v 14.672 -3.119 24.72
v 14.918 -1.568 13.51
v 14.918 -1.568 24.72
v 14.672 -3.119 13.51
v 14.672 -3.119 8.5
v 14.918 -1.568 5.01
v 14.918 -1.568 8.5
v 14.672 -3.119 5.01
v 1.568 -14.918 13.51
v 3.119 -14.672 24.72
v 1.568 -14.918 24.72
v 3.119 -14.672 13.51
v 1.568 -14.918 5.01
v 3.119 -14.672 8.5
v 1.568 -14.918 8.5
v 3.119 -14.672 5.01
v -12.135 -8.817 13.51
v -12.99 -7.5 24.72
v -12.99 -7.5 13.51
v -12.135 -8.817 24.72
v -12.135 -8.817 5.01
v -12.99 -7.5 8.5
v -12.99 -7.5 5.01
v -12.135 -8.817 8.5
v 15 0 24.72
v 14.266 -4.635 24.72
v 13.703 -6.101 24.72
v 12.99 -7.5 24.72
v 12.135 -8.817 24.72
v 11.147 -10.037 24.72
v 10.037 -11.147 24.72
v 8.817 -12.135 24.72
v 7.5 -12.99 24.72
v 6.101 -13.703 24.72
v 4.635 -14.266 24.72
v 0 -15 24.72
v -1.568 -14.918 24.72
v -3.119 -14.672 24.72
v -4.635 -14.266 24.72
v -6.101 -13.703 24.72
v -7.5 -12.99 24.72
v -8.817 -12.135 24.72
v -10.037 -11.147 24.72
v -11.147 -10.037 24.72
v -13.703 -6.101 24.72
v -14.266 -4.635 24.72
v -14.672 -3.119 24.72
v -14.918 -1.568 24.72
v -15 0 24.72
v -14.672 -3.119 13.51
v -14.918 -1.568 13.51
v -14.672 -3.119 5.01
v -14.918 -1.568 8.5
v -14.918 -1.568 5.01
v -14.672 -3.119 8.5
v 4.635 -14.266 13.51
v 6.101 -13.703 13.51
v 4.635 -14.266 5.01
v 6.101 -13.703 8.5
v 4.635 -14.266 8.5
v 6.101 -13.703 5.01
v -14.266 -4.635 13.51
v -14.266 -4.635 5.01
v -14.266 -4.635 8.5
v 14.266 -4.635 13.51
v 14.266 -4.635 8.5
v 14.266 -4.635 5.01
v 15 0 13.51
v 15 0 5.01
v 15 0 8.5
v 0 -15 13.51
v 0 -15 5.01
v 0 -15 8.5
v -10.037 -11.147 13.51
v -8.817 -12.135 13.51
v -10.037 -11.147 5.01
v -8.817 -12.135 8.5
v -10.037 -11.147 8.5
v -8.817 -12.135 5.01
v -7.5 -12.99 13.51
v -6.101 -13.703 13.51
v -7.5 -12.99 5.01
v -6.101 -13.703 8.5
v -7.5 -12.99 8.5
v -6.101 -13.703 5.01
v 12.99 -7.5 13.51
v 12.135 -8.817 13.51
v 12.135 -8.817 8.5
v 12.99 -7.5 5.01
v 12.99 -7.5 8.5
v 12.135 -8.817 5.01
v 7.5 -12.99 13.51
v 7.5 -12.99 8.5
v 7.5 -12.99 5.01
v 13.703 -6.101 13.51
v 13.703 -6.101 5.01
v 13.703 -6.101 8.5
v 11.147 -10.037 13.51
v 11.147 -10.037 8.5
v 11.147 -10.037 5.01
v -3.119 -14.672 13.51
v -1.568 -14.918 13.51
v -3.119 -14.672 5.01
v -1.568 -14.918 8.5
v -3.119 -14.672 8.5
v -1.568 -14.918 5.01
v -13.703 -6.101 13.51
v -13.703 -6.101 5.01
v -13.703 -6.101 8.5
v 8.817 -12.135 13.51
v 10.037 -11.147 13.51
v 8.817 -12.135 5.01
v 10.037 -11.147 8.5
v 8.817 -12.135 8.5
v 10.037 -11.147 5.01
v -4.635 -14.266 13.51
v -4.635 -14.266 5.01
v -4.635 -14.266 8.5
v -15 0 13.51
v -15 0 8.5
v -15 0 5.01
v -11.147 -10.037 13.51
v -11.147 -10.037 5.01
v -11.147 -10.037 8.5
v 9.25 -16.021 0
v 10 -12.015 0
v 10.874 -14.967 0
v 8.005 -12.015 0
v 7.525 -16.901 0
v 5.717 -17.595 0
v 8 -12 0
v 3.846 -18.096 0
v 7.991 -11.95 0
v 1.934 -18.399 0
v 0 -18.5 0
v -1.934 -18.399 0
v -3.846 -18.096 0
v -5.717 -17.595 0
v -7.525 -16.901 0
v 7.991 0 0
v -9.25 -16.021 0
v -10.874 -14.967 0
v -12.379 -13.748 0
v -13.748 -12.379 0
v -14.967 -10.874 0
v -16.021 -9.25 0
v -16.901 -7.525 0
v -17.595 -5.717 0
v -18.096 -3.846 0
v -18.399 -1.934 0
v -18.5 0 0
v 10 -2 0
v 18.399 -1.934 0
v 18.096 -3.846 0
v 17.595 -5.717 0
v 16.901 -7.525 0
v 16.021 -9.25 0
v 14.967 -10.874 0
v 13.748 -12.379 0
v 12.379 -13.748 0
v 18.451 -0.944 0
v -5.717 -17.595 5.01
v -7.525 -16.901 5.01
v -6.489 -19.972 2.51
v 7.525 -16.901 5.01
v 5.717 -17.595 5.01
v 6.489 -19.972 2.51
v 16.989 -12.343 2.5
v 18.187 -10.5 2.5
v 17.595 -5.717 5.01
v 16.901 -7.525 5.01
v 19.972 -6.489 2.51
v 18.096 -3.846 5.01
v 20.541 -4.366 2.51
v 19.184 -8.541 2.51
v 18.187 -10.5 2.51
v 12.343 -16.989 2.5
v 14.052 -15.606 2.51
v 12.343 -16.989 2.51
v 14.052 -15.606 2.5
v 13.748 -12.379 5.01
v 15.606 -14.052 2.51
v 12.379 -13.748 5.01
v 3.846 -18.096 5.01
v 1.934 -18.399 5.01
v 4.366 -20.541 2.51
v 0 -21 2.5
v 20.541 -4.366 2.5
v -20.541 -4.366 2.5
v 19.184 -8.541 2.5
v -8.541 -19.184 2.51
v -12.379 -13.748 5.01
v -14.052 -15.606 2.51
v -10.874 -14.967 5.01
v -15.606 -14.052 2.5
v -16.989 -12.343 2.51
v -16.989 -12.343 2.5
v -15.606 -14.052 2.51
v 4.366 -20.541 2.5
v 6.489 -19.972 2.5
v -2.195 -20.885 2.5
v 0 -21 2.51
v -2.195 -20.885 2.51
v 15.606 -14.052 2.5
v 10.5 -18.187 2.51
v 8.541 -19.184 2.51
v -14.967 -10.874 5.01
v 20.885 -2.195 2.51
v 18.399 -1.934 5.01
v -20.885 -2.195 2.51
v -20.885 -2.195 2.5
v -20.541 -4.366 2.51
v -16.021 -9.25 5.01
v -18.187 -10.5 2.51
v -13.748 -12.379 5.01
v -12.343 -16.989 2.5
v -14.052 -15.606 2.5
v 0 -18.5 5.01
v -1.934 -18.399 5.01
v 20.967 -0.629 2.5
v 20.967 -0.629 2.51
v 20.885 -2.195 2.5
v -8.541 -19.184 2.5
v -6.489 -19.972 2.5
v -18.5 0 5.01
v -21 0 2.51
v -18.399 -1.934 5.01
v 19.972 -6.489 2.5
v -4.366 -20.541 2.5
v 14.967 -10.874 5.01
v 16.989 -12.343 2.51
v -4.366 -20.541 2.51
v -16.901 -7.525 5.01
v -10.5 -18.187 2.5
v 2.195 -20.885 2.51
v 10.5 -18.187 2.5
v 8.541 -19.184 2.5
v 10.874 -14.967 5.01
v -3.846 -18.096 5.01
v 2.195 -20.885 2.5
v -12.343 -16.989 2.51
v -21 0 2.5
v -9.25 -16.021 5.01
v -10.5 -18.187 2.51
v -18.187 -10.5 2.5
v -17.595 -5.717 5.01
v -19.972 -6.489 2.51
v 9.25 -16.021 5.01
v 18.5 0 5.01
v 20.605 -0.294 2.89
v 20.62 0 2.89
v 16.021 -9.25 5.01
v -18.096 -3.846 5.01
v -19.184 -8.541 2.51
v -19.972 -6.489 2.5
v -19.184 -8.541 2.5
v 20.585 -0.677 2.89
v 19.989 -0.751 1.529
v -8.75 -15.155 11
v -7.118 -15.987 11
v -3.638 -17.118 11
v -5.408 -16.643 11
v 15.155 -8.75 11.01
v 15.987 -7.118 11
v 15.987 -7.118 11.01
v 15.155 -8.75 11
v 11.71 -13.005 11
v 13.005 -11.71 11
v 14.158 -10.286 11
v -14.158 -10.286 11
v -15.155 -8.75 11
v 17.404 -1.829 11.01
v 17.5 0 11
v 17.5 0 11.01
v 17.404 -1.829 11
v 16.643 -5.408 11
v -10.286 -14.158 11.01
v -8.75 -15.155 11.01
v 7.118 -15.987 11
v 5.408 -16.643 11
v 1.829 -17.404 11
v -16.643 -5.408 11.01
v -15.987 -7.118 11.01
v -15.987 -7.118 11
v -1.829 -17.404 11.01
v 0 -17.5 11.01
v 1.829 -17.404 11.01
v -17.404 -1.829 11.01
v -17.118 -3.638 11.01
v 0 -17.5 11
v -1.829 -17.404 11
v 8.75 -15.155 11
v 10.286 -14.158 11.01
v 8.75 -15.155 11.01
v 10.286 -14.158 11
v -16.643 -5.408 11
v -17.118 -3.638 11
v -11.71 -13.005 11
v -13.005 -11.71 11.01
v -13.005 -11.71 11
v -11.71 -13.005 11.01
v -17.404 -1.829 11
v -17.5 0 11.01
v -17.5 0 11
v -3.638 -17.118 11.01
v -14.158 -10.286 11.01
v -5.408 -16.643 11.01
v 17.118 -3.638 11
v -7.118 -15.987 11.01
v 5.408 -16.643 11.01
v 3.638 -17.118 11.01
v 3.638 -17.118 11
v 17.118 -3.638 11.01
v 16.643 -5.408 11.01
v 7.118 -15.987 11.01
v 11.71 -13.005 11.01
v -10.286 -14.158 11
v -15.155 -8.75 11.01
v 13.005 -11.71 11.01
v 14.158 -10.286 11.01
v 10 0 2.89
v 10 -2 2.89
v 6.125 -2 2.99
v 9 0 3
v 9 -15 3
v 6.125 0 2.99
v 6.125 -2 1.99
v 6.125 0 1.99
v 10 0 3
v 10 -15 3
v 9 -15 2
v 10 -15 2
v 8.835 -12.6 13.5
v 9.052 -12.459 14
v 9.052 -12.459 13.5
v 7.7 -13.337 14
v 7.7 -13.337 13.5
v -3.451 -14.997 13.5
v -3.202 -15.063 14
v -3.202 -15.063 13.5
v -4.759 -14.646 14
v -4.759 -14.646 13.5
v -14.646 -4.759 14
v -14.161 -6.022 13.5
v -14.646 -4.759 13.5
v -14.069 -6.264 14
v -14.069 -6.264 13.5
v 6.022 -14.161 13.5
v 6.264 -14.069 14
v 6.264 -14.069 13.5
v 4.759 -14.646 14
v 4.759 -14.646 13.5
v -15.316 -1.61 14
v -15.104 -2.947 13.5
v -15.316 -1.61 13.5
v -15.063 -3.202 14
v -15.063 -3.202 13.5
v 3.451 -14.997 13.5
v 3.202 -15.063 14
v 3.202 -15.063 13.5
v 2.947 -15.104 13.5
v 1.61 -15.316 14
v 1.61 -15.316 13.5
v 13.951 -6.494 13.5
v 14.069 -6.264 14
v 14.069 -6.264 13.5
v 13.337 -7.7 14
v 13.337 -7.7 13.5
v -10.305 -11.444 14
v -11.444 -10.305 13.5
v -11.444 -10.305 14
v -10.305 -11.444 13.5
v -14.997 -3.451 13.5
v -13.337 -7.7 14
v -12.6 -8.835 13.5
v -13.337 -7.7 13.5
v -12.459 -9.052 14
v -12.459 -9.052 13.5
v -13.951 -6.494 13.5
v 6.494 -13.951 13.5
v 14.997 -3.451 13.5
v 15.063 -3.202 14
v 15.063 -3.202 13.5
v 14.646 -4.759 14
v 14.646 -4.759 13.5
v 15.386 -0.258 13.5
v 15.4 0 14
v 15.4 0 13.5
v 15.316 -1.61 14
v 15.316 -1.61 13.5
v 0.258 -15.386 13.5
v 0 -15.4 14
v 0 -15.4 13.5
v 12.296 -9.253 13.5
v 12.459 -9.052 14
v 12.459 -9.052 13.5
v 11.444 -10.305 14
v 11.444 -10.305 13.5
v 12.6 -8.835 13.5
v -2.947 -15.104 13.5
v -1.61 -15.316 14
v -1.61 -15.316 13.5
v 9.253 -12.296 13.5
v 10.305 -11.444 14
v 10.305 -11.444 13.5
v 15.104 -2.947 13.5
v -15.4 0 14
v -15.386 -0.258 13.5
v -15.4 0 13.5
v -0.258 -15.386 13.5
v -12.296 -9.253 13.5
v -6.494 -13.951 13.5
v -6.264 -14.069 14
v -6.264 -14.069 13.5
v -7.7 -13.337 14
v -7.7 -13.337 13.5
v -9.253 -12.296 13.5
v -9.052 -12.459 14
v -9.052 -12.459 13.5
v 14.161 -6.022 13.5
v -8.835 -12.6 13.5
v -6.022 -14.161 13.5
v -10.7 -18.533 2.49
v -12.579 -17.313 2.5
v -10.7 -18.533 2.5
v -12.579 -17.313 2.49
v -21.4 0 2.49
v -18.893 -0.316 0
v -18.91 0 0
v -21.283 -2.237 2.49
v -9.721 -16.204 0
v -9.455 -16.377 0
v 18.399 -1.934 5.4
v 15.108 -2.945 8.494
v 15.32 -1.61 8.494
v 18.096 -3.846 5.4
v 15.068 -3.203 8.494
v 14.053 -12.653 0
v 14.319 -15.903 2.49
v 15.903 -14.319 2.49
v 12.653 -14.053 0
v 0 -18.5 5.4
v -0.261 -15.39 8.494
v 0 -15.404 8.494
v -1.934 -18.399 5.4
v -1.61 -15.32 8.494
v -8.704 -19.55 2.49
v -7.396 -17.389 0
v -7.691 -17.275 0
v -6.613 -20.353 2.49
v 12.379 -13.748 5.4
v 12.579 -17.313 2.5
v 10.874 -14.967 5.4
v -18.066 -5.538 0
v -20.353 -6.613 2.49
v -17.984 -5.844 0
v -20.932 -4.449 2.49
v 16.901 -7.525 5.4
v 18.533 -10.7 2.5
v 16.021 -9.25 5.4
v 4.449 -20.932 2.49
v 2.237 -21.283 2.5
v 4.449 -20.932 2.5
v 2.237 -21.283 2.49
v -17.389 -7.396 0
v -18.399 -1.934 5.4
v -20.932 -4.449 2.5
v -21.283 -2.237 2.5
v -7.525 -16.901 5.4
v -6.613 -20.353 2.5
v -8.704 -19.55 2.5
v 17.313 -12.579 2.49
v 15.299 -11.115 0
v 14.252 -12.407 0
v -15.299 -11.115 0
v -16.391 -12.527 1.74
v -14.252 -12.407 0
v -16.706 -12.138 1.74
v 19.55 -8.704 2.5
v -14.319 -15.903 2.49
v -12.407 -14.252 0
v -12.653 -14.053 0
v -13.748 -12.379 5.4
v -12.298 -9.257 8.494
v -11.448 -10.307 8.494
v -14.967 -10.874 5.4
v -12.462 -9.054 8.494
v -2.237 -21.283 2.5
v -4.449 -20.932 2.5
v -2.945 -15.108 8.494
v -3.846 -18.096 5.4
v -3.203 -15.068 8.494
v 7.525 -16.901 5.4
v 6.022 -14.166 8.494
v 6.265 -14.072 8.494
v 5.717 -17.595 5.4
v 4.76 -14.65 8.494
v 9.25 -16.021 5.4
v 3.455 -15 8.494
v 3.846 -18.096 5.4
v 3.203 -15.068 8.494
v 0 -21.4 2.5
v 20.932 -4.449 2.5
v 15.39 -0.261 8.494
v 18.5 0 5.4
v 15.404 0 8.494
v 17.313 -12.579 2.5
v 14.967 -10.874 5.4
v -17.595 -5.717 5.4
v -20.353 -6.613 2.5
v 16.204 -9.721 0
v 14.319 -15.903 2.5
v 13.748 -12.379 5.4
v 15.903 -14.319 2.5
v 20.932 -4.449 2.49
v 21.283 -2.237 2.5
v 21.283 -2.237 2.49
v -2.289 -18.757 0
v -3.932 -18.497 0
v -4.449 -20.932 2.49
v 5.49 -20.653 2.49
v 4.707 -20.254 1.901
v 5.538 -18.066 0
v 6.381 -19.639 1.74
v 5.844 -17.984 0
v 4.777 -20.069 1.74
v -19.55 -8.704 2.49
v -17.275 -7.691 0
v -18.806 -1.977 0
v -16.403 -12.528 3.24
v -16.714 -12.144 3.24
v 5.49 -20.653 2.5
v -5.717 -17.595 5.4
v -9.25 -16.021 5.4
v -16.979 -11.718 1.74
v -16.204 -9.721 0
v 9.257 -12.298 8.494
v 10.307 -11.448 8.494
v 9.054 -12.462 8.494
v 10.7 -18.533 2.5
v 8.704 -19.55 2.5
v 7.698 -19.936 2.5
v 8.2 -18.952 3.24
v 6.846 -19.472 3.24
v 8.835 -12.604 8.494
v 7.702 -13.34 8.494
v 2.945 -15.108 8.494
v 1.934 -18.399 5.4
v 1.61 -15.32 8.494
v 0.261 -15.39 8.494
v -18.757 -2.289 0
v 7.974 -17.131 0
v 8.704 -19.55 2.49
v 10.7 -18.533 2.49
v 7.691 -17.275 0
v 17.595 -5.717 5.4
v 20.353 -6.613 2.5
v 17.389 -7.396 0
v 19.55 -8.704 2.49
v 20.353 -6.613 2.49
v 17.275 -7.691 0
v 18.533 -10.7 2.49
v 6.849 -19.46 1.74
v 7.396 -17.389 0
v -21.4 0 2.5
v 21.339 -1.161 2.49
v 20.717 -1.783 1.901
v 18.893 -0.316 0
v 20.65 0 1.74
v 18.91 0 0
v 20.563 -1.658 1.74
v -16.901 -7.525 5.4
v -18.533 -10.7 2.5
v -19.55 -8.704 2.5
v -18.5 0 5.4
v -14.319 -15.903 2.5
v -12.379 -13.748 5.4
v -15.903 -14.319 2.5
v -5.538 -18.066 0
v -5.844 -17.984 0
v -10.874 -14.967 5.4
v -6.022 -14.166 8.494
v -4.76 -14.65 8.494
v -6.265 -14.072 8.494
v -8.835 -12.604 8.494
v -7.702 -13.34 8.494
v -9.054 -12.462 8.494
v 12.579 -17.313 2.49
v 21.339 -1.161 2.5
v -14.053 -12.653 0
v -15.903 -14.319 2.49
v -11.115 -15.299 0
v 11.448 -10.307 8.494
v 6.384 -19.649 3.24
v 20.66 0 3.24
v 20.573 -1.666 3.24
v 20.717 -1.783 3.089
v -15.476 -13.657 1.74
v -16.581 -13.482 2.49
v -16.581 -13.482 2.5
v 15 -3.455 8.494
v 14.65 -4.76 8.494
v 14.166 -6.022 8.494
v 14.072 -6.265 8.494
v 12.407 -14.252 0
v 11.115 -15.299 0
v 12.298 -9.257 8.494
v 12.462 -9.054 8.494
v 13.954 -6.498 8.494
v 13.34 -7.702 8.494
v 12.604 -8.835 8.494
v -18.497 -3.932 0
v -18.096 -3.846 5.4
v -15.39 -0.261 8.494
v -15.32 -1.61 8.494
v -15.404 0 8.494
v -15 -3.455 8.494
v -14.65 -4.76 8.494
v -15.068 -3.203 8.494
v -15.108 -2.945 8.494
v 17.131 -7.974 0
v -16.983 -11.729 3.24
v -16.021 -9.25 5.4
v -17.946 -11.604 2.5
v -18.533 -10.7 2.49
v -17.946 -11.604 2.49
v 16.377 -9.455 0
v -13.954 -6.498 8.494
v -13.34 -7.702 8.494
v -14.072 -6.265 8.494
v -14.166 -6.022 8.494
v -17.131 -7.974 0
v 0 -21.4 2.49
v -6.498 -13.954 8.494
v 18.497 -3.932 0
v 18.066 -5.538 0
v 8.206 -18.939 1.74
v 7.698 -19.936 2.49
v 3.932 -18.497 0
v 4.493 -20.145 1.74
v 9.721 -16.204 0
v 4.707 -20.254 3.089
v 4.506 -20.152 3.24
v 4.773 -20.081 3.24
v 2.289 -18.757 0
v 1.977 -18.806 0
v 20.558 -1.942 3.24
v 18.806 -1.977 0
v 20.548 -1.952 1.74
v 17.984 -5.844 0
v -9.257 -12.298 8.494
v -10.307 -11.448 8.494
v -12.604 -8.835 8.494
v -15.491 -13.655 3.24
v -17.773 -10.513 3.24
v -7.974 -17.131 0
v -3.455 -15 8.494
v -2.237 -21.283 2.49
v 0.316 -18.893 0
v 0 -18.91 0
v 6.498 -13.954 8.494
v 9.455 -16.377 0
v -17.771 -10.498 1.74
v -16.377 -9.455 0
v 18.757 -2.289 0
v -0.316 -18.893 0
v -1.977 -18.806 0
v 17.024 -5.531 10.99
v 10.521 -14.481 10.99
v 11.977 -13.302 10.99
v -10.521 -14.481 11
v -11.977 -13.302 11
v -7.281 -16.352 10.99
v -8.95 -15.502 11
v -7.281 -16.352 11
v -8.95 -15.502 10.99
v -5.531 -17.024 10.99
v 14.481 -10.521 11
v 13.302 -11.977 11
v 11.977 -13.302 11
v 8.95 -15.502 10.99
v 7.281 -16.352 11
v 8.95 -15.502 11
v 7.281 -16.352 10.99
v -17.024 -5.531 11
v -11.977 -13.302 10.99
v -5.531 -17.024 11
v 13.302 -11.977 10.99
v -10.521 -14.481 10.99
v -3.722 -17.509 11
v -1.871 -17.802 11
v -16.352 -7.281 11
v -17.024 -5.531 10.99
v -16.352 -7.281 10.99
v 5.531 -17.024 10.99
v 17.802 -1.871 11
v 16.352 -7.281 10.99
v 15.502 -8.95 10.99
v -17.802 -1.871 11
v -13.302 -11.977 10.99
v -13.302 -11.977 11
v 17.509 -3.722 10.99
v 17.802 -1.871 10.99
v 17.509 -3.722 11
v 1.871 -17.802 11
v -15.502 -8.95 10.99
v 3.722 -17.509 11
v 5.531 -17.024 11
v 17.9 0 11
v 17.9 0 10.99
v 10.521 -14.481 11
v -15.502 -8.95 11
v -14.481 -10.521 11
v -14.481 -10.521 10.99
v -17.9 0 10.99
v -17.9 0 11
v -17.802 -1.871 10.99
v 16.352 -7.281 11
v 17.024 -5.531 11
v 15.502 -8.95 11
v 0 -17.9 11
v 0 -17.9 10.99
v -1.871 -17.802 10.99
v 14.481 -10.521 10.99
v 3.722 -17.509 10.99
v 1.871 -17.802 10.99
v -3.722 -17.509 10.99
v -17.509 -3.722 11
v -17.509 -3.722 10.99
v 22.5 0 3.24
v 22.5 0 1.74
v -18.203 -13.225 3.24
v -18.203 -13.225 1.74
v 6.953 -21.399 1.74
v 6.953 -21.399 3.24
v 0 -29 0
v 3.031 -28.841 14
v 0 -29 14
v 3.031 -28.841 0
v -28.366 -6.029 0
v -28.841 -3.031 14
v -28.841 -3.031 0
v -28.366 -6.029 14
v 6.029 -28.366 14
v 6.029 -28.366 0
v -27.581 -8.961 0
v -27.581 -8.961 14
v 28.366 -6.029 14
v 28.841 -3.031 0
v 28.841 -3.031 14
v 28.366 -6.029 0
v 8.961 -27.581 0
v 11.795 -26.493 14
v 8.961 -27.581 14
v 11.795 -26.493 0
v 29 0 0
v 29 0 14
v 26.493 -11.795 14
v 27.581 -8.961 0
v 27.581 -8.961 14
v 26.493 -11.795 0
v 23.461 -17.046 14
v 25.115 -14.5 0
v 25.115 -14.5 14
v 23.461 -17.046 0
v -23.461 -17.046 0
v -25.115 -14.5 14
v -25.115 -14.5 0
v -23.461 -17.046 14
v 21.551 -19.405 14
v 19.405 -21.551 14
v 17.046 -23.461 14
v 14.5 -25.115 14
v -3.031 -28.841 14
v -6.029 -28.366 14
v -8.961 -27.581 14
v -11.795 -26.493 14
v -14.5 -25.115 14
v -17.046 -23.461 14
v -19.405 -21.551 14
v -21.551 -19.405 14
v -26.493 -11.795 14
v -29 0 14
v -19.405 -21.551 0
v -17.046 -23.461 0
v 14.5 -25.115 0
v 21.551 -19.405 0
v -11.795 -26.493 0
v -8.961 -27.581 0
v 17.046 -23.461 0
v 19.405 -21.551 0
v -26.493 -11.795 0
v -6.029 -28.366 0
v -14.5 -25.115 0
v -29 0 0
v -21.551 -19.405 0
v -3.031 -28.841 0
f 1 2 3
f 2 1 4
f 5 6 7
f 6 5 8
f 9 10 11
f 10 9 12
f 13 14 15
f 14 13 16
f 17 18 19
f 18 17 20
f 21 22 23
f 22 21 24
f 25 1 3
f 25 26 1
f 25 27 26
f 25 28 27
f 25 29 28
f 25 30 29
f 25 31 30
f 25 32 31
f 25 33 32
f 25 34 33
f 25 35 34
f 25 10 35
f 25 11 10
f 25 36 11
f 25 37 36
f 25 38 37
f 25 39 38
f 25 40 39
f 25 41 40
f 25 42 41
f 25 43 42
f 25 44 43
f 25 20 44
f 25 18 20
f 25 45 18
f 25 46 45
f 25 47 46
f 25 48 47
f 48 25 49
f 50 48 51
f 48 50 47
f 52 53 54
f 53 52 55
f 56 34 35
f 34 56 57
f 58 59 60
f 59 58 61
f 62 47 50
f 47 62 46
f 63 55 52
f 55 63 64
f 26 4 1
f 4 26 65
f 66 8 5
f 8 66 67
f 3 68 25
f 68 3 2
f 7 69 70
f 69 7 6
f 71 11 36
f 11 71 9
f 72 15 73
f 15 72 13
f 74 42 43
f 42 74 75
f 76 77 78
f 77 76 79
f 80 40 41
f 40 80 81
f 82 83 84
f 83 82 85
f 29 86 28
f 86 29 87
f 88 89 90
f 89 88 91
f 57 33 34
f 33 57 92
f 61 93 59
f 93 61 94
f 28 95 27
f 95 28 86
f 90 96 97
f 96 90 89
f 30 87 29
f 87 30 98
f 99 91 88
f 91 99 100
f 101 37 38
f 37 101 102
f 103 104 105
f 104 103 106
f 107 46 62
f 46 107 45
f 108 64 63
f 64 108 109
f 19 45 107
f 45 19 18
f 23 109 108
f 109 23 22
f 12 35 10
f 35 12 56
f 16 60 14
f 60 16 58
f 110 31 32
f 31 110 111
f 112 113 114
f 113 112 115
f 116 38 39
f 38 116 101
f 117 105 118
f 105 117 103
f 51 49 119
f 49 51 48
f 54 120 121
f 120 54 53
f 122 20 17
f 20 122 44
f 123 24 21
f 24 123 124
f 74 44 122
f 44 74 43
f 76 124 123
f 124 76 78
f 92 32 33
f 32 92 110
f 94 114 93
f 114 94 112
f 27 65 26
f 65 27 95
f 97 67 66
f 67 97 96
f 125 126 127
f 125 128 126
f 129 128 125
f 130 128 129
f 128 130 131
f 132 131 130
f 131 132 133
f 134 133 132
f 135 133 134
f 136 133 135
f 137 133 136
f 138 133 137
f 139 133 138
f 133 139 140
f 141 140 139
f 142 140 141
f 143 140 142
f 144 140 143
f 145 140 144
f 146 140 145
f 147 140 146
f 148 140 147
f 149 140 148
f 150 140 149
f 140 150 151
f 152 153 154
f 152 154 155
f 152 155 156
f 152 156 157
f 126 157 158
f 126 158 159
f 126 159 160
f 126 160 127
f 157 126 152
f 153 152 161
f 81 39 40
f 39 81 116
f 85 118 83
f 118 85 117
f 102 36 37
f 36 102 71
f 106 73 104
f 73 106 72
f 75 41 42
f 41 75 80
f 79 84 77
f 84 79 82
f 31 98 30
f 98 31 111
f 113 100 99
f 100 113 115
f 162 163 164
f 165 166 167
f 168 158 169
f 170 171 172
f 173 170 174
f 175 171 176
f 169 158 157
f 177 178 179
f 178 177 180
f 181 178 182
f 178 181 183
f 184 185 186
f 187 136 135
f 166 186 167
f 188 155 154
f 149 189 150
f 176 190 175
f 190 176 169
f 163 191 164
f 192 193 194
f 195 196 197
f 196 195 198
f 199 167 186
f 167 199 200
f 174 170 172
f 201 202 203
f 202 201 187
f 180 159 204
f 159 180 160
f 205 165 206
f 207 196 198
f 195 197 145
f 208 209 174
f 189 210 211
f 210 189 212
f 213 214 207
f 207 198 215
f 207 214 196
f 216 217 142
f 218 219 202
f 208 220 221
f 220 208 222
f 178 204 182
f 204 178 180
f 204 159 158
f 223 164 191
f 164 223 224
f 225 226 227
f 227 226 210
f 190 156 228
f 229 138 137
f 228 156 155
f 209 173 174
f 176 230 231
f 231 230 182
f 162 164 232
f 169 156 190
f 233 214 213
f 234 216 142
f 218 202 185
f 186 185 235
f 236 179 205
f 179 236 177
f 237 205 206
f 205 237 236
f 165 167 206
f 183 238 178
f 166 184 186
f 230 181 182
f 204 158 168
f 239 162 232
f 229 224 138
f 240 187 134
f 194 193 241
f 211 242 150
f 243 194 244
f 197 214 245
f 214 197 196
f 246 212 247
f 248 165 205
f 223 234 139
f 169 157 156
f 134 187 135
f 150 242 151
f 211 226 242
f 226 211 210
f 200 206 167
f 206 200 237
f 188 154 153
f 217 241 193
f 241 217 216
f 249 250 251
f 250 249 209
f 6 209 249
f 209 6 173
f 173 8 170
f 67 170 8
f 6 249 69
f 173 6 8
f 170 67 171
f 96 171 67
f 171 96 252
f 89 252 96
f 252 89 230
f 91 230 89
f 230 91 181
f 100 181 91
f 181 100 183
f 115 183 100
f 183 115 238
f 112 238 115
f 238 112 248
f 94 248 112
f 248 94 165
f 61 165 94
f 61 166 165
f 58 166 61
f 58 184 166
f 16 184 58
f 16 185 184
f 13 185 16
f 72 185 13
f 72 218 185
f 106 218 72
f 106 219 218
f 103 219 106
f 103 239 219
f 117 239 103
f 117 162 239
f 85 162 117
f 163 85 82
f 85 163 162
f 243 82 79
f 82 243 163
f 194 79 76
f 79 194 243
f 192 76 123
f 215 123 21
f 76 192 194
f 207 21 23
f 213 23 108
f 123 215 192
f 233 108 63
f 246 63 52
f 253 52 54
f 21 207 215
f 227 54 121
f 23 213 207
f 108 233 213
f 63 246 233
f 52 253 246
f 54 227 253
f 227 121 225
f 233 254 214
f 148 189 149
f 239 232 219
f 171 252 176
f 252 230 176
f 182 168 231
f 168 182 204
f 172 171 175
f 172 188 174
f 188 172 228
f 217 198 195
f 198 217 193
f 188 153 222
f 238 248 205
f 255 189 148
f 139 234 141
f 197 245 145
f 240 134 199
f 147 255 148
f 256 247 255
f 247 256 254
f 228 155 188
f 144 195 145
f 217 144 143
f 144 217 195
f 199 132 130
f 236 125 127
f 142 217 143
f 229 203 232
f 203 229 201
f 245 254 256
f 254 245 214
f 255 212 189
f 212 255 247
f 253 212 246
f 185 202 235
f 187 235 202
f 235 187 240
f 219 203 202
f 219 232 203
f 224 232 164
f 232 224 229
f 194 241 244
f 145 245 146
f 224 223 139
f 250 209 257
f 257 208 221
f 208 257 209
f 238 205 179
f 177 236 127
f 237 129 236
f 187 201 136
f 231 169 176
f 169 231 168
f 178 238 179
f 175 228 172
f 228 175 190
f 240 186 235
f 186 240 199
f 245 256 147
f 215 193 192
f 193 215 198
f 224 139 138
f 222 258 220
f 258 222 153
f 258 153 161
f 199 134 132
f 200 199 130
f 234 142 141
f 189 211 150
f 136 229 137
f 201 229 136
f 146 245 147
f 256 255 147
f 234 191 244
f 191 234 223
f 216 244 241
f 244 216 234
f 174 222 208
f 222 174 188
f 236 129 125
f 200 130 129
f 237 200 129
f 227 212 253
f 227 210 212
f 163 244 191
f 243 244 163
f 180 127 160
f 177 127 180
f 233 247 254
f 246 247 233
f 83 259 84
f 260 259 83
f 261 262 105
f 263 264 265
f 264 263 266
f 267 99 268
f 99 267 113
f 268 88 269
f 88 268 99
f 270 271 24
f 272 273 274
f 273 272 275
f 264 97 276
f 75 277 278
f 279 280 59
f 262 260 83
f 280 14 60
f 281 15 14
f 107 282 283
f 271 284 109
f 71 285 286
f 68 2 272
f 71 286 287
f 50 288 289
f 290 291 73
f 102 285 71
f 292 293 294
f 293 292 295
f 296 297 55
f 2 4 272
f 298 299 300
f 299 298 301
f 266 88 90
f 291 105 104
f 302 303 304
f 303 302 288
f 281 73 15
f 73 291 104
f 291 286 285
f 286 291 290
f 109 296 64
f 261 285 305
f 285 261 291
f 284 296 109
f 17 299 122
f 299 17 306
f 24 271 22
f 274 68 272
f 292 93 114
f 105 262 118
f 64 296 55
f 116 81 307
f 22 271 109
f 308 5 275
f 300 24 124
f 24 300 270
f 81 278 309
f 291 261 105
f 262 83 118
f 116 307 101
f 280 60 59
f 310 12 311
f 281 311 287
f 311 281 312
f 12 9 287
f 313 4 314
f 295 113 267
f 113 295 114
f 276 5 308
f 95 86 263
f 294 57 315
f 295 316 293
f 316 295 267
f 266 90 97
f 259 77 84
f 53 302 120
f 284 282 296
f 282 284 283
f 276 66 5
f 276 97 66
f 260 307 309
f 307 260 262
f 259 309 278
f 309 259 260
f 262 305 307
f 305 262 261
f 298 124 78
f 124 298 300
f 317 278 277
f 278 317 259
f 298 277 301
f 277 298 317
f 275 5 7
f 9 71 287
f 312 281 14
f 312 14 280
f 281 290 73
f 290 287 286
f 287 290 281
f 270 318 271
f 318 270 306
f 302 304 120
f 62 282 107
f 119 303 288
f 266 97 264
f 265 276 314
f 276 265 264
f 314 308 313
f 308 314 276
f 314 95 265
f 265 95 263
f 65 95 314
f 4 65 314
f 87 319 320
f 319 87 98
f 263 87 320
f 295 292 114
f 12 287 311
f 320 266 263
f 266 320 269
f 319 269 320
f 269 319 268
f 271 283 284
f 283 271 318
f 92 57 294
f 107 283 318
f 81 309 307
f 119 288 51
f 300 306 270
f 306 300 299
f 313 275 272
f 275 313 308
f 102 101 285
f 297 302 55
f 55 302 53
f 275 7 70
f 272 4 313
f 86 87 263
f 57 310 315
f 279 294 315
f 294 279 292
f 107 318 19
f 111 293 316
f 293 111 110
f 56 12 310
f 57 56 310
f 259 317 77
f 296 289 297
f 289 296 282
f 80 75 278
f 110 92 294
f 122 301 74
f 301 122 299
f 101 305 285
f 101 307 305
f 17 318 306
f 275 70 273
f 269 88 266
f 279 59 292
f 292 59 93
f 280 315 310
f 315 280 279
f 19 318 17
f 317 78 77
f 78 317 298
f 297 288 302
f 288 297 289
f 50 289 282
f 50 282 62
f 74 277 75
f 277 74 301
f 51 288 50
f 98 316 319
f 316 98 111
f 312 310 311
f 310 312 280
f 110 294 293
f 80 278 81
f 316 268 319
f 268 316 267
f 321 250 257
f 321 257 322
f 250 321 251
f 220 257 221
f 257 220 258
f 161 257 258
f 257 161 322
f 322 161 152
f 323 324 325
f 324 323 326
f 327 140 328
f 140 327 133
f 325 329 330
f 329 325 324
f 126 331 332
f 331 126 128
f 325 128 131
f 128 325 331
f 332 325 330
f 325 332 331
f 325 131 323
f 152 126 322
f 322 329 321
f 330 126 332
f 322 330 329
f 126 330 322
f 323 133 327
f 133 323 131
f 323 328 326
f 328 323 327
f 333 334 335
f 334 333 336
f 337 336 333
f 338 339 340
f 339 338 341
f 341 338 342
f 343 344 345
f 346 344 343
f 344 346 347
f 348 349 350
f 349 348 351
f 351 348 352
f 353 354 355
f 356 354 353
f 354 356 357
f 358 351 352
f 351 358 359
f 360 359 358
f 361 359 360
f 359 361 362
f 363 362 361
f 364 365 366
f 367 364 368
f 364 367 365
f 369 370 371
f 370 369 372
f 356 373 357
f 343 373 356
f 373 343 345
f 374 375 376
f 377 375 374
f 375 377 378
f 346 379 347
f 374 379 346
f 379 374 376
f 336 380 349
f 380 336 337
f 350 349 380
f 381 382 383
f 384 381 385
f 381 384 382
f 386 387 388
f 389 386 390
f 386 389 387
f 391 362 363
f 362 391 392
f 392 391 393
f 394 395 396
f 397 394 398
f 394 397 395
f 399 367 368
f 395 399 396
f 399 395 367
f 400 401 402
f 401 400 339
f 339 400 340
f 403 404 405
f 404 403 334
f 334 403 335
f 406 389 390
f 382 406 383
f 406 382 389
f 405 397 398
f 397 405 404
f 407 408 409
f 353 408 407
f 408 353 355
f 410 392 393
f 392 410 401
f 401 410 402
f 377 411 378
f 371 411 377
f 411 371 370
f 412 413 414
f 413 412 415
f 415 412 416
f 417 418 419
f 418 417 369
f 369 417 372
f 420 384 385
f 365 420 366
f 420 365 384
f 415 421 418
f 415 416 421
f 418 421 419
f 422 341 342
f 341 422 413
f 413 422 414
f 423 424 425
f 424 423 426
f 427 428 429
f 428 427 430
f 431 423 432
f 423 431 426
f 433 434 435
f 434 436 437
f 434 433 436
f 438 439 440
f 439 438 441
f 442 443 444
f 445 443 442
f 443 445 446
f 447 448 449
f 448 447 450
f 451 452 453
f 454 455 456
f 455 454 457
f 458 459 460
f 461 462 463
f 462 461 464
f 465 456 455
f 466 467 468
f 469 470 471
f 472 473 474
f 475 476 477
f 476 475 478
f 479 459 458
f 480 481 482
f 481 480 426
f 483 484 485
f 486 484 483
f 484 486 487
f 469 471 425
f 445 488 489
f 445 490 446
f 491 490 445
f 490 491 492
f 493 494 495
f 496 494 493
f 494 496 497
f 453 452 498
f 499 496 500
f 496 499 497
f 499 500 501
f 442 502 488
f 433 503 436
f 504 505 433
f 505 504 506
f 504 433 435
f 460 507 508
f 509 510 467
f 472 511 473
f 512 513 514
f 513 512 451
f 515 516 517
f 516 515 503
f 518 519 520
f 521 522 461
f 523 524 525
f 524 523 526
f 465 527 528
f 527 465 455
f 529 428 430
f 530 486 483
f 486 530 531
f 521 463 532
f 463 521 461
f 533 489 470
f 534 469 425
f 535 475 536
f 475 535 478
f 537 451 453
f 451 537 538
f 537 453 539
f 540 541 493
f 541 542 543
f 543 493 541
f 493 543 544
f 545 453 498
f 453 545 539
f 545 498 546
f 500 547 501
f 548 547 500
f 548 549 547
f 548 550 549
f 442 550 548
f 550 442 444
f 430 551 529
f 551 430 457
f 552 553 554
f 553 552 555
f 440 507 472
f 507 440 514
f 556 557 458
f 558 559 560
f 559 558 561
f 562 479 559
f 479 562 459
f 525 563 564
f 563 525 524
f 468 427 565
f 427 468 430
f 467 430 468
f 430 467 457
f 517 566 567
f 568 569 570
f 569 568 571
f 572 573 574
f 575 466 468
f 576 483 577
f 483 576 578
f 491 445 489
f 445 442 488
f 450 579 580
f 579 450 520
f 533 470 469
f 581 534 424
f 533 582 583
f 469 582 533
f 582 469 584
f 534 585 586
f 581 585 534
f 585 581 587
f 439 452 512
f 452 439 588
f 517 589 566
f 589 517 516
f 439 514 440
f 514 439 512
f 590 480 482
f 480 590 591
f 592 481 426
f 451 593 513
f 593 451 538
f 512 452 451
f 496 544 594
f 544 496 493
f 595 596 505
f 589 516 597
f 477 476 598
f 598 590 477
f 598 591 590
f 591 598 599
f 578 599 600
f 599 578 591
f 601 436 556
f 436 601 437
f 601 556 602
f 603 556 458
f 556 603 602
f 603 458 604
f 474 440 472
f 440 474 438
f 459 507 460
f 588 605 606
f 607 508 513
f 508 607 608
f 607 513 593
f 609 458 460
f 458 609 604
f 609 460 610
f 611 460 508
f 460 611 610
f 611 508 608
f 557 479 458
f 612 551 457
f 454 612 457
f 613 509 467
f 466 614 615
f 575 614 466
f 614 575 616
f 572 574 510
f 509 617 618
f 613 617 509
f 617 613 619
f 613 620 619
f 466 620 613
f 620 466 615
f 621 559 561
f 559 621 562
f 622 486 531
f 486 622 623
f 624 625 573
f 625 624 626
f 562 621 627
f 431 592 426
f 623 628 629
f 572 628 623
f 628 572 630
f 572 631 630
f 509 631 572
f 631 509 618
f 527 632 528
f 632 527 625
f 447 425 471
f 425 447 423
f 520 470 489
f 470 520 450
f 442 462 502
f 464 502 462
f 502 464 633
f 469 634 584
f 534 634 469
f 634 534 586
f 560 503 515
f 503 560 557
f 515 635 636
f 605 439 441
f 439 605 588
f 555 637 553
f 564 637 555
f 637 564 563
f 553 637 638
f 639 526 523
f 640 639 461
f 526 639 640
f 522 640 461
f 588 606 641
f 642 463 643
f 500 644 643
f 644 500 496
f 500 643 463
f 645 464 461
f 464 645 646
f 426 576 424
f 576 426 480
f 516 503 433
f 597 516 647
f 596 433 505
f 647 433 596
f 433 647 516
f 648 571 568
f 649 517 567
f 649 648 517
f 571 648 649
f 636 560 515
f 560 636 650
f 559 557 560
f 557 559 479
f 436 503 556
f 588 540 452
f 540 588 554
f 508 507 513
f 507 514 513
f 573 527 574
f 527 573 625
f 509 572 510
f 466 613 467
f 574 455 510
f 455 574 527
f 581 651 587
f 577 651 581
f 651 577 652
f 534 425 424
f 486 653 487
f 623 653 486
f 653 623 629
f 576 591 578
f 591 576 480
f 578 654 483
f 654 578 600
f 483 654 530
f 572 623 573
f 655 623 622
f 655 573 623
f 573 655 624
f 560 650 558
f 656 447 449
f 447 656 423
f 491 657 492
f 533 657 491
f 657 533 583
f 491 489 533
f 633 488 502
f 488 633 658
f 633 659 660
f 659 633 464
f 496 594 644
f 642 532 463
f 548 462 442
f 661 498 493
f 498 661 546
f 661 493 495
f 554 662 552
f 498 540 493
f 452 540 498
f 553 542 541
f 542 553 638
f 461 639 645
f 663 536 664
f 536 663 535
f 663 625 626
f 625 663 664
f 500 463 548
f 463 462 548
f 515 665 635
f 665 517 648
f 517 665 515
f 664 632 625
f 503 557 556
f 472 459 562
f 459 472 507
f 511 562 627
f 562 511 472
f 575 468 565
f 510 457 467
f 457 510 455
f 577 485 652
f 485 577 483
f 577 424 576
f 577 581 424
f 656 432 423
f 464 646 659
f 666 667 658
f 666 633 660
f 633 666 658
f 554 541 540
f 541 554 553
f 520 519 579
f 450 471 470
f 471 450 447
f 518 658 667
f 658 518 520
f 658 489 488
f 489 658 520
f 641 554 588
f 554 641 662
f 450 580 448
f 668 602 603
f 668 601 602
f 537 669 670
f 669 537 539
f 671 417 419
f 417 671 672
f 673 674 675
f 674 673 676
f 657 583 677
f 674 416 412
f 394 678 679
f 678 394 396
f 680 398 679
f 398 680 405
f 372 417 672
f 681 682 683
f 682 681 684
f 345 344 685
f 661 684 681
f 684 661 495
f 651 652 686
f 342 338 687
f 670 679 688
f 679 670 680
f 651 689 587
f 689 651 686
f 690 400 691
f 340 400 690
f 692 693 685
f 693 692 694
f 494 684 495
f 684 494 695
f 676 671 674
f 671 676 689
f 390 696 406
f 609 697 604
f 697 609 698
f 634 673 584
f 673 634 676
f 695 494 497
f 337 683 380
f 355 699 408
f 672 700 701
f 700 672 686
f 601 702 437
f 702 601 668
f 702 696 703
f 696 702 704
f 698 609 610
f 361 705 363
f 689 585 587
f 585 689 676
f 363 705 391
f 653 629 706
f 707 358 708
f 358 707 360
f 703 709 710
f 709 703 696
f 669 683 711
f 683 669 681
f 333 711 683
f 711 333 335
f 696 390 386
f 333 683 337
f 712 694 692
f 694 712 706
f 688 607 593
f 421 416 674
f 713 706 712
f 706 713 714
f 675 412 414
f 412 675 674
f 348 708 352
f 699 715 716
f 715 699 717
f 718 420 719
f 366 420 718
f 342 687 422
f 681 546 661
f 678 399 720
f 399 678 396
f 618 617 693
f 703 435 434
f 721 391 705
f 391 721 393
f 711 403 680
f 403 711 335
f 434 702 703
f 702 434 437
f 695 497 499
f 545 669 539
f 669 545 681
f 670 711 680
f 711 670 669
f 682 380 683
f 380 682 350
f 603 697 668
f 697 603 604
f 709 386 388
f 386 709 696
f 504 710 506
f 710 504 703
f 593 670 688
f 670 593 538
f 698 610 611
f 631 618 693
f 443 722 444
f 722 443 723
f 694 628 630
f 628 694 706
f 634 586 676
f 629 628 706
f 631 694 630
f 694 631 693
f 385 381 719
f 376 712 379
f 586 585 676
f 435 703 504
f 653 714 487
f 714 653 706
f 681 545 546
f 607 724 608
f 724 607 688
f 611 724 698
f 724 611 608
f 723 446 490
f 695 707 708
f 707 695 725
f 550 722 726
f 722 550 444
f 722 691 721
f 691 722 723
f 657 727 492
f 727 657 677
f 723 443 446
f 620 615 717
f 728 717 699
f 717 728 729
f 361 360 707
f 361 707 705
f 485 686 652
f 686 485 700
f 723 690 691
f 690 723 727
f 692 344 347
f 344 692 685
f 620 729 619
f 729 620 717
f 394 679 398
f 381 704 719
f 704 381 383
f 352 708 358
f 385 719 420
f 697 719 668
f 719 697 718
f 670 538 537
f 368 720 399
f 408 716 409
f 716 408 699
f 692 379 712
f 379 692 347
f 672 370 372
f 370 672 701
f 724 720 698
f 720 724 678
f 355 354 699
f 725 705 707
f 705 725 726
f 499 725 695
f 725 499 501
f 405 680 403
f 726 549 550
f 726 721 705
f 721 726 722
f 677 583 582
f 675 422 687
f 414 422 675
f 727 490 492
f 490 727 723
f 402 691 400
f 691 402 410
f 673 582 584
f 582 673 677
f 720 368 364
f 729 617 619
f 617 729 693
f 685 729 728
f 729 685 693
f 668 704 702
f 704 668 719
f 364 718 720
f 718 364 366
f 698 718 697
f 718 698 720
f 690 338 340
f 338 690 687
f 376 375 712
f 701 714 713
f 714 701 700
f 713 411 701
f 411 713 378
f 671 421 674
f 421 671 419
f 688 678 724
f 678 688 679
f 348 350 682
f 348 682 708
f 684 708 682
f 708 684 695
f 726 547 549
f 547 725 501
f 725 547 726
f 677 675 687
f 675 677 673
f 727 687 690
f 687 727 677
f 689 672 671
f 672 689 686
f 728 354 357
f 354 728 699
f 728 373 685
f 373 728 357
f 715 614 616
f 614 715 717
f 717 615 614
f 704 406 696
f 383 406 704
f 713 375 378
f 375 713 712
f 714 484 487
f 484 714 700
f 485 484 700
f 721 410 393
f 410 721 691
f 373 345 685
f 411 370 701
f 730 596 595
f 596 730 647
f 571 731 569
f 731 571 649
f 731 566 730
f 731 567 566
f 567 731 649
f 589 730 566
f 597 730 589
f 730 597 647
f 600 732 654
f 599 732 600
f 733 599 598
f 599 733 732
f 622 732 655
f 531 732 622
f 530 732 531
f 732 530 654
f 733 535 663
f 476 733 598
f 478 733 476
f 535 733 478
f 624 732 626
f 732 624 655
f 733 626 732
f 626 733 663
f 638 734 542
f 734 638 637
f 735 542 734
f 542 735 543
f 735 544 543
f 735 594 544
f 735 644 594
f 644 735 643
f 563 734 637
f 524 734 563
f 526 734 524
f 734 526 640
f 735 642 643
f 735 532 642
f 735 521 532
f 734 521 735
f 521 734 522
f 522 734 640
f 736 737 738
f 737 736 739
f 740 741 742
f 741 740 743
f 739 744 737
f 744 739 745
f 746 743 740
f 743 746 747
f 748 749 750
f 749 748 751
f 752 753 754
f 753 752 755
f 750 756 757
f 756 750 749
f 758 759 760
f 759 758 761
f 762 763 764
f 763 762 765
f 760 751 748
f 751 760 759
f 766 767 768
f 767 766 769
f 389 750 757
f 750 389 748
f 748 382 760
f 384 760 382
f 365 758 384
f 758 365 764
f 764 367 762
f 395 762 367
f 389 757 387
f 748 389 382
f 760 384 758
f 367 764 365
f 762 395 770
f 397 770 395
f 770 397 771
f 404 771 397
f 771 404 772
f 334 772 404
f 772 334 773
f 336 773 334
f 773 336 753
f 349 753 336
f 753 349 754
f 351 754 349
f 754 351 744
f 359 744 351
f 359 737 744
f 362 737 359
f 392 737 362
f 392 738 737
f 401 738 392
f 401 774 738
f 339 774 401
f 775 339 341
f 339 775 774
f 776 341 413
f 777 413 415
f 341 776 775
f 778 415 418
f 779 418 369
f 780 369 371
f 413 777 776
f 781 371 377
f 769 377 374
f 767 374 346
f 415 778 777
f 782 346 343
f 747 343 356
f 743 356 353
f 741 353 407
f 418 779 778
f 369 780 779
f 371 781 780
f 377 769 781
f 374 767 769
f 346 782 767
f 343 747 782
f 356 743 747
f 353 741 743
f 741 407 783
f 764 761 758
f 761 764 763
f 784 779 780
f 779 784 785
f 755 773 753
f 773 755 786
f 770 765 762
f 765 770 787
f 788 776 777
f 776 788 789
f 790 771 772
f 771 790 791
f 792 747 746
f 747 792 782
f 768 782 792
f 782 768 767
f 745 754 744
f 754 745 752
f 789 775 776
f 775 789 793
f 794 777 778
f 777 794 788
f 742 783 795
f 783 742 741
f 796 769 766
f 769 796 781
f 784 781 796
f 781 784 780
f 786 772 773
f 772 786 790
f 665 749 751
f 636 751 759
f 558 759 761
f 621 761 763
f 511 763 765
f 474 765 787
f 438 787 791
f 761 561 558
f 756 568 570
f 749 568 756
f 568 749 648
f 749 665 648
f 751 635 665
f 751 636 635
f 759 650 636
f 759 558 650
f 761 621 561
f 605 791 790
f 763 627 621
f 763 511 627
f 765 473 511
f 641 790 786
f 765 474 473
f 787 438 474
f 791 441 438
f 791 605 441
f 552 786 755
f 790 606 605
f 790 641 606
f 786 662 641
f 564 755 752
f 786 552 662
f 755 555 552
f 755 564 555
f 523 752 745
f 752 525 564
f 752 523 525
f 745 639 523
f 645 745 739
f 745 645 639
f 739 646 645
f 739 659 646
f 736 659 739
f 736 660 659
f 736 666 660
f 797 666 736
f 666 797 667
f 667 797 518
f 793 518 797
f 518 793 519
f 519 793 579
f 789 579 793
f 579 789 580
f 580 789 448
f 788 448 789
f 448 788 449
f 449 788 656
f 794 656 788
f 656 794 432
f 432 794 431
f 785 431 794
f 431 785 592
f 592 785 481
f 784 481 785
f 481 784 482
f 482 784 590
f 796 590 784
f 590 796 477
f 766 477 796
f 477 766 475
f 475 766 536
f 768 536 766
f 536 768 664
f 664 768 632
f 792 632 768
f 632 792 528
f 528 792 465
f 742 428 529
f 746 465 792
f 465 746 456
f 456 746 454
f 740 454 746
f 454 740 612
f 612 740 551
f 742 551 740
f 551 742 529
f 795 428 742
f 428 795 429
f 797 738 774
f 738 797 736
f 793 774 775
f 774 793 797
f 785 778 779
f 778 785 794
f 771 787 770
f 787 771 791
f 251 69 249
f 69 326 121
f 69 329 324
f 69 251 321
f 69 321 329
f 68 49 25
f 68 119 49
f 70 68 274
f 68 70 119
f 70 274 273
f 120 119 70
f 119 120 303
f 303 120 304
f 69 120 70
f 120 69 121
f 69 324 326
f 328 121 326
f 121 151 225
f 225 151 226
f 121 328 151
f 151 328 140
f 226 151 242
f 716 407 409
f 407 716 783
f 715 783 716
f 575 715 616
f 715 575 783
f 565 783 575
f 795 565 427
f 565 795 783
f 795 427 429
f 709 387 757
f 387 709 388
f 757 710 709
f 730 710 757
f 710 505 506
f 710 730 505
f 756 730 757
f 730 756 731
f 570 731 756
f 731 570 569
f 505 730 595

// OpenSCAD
// file: values.inc.scad
KNOB_DIAMETER = 30;
KNOB_HEIGHT   = 30;

BOX_SIZE      = 70;
BOX_HEIGHT    = 14;
N             = 48;
CHAMFER       =  3;

TURNS         =  5;
LETTER_DEPTH  = 1.5;

PLAY =  0.20*4;
ATOM =  0.01;
// main file
include <values.inc.scad>;

WHEEL_H = 5;

D1 = KNOB_DIAMETER + BOX_HEIGHT/2;
D2 = KNOB_DIAMETER + BOX_HEIGHT/2 + WHEEL_H/2;
D3 = KNOB_DIAMETER + BOX_HEIGHT/2 + WHEEL_H;
D4 = KNOB_DIAMETER + BOX_HEIGHT/2 - WHEEL_H/2;

SPRING_CAVITY_THICKNESS = 1;
SPRING_CAVITY_SIDE      = KNOB_DIAMETER *.4;
SPRING_RATCHET_INSET    = 1.5;
SPRING_RATCHET_INSET_2  = 6;

SPRING_CAVITY_DX = D1/2 - sqrt(2)*SPRING_CAVITY_SIDE/2 + WHEEL_H/2 + SPRING_RATCHET_INSET;

$fn  = $preview ? 40 : 60;


module wheel(d, h, xd) {
    hull() {
        xtra = xd ? xd/2 : 0;
        translate([0, 0, 0 - xtra]) cylinder(d=d       , h=ATOM);
        translate([0, 0, h/2     ]) cylinder(d=d+h + xd, h=ATOM);
        translate([0, 0, h + xtra]) cylinder(d=d       , h=ATOM);
    }
}


module ratchet0(for_hollowing=false) {
    xd = for_hollowing ? PLAY : 0;
    h = WHEEL_H/2 + BOX_HEIGHT/4 + WHEEL_H/2;

    // pillar
    cylinder(d=KNOB_DIAMETER + xd, h=for_hollowing ? BOX_HEIGHT + 1 : BOX_HEIGHT + (KNOB_HEIGHT-BOX_HEIGHT)*.67);

    // bottom wheel
    hull() {
        wheel(D1, WHEEL_H, xd);
        if (for_hollowing) {
            hh = D1+xd+WHEEL_H;
            translate([0, 0, WHEEL_H/2])
            cylinder(d1=hh, d2=0, h=hh/2);
        }
    }

    // median wheel
    translate([0, 0, h])
    wheel(KNOB_DIAMETER, WHEEL_H, xd);
}

module spring_cavity() {
    h = SPRING_CAVITY_THICKNESS/2 + WHEEL_H/2;

    translate([0, 0, -.1])
    hull() {
        translate([D1/2 + WHEEL_H/2 + SPRING_CAVITY_THICKNESS, 0, h/2])
        translate([-SPRING_CAVITY_SIDE/2, 0, -ATOM])
        cube([SPRING_CAVITY_SIDE, SPRING_CAVITY_THICKNESS, h], center=true);

        l = SPRING_CAVITY_THICKNESS*4;
        translate([D1/2 + WHEEL_H/2 -SPRING_CAVITY_SIDE, 0, 0])
        translate([-SPRING_CAVITY_THICKNESS, -l/2, -ATOM])
        cube([SPRING_CAVITY_THICKNESS*2, l, h]);
    }


    hull() {
        translate([D1/2 + WHEEL_H/2 -SPRING_CAVITY_SIDE+SPRING_CAVITY_THICKNESS/2, 0, WHEEL_H/2])
        cube([SPRING_CAVITY_THICKNESS, SPRING_CAVITY_SIDE*2 + SPRING_RATCHET_INSET_2, SPRING_CAVITY_THICKNESS], center=true);

        ll = SPRING_CAVITY_SIDE;
        translate([D1/2 + WHEEL_H/2 -SPRING_CAVITY_SIDE, 0, 0])
        translate([-SPRING_CAVITY_THICKNESS, -ll, -ATOM])
        cube([SPRING_CAVITY_THICKNESS*2, ll*2, ATOM]);

        th = SPRING_CAVITY_THICKNESS*1.75;
        l = SPRING_CAVITY_THICKNESS*4;
        translate([D1/2 + WHEEL_H/2 -SPRING_CAVITY_SIDE -2, 0, WHEEL_H/2 - SPRING_CAVITY_THICKNESS/2])
        translate([-th/2, -l/2, -ATOM])
        cube([th, l, SPRING_CAVITY_THICKNESS]);
    }
}


module ratchet(for_hollowing=false) {
    if (for_hollowing) {
        ratchet0(true);
    } else {
        difference() {
            ratchet0(false);
            spring_cavity();
        }
    }
}


module ratchet_cavity() {
    ratchet(true);
    for (i=[0:TURNS-1]) {
        rotate([0, 0, i*360/TURNS])
        translate([SPRING_CAVITY_DX, 0, WHEEL_H/2])
        rotate([0, 0, 45])
        cube([SPRING_CAVITY_SIDE, SPRING_CAVITY_SIDE, SPRING_CAVITY_THICKNESS*1.5], center=true);
    }
}


module ratchet_demo() {
    ratchet();

    if(1)
    difference() {
        cylinder(d=KNOB_DIAMETER+(BOX_SIZE-KNOB_DIAMETER)*.7, h=BOX_HEIGHT);
        translate([0, 0, -ATOM])
        ratchet_cavity();
    }
}


difference() {
    ratchet_demo();
    
    if (1 || $preview) {
        w = KNOB_DIAMETER*4;
        translate([-KNOB_DIAMETER*2, 0, -BOX_HEIGHT])
        cube([w, w, BOX_HEIGHT*3]);
    }
}

//%ratchet_cavity();
